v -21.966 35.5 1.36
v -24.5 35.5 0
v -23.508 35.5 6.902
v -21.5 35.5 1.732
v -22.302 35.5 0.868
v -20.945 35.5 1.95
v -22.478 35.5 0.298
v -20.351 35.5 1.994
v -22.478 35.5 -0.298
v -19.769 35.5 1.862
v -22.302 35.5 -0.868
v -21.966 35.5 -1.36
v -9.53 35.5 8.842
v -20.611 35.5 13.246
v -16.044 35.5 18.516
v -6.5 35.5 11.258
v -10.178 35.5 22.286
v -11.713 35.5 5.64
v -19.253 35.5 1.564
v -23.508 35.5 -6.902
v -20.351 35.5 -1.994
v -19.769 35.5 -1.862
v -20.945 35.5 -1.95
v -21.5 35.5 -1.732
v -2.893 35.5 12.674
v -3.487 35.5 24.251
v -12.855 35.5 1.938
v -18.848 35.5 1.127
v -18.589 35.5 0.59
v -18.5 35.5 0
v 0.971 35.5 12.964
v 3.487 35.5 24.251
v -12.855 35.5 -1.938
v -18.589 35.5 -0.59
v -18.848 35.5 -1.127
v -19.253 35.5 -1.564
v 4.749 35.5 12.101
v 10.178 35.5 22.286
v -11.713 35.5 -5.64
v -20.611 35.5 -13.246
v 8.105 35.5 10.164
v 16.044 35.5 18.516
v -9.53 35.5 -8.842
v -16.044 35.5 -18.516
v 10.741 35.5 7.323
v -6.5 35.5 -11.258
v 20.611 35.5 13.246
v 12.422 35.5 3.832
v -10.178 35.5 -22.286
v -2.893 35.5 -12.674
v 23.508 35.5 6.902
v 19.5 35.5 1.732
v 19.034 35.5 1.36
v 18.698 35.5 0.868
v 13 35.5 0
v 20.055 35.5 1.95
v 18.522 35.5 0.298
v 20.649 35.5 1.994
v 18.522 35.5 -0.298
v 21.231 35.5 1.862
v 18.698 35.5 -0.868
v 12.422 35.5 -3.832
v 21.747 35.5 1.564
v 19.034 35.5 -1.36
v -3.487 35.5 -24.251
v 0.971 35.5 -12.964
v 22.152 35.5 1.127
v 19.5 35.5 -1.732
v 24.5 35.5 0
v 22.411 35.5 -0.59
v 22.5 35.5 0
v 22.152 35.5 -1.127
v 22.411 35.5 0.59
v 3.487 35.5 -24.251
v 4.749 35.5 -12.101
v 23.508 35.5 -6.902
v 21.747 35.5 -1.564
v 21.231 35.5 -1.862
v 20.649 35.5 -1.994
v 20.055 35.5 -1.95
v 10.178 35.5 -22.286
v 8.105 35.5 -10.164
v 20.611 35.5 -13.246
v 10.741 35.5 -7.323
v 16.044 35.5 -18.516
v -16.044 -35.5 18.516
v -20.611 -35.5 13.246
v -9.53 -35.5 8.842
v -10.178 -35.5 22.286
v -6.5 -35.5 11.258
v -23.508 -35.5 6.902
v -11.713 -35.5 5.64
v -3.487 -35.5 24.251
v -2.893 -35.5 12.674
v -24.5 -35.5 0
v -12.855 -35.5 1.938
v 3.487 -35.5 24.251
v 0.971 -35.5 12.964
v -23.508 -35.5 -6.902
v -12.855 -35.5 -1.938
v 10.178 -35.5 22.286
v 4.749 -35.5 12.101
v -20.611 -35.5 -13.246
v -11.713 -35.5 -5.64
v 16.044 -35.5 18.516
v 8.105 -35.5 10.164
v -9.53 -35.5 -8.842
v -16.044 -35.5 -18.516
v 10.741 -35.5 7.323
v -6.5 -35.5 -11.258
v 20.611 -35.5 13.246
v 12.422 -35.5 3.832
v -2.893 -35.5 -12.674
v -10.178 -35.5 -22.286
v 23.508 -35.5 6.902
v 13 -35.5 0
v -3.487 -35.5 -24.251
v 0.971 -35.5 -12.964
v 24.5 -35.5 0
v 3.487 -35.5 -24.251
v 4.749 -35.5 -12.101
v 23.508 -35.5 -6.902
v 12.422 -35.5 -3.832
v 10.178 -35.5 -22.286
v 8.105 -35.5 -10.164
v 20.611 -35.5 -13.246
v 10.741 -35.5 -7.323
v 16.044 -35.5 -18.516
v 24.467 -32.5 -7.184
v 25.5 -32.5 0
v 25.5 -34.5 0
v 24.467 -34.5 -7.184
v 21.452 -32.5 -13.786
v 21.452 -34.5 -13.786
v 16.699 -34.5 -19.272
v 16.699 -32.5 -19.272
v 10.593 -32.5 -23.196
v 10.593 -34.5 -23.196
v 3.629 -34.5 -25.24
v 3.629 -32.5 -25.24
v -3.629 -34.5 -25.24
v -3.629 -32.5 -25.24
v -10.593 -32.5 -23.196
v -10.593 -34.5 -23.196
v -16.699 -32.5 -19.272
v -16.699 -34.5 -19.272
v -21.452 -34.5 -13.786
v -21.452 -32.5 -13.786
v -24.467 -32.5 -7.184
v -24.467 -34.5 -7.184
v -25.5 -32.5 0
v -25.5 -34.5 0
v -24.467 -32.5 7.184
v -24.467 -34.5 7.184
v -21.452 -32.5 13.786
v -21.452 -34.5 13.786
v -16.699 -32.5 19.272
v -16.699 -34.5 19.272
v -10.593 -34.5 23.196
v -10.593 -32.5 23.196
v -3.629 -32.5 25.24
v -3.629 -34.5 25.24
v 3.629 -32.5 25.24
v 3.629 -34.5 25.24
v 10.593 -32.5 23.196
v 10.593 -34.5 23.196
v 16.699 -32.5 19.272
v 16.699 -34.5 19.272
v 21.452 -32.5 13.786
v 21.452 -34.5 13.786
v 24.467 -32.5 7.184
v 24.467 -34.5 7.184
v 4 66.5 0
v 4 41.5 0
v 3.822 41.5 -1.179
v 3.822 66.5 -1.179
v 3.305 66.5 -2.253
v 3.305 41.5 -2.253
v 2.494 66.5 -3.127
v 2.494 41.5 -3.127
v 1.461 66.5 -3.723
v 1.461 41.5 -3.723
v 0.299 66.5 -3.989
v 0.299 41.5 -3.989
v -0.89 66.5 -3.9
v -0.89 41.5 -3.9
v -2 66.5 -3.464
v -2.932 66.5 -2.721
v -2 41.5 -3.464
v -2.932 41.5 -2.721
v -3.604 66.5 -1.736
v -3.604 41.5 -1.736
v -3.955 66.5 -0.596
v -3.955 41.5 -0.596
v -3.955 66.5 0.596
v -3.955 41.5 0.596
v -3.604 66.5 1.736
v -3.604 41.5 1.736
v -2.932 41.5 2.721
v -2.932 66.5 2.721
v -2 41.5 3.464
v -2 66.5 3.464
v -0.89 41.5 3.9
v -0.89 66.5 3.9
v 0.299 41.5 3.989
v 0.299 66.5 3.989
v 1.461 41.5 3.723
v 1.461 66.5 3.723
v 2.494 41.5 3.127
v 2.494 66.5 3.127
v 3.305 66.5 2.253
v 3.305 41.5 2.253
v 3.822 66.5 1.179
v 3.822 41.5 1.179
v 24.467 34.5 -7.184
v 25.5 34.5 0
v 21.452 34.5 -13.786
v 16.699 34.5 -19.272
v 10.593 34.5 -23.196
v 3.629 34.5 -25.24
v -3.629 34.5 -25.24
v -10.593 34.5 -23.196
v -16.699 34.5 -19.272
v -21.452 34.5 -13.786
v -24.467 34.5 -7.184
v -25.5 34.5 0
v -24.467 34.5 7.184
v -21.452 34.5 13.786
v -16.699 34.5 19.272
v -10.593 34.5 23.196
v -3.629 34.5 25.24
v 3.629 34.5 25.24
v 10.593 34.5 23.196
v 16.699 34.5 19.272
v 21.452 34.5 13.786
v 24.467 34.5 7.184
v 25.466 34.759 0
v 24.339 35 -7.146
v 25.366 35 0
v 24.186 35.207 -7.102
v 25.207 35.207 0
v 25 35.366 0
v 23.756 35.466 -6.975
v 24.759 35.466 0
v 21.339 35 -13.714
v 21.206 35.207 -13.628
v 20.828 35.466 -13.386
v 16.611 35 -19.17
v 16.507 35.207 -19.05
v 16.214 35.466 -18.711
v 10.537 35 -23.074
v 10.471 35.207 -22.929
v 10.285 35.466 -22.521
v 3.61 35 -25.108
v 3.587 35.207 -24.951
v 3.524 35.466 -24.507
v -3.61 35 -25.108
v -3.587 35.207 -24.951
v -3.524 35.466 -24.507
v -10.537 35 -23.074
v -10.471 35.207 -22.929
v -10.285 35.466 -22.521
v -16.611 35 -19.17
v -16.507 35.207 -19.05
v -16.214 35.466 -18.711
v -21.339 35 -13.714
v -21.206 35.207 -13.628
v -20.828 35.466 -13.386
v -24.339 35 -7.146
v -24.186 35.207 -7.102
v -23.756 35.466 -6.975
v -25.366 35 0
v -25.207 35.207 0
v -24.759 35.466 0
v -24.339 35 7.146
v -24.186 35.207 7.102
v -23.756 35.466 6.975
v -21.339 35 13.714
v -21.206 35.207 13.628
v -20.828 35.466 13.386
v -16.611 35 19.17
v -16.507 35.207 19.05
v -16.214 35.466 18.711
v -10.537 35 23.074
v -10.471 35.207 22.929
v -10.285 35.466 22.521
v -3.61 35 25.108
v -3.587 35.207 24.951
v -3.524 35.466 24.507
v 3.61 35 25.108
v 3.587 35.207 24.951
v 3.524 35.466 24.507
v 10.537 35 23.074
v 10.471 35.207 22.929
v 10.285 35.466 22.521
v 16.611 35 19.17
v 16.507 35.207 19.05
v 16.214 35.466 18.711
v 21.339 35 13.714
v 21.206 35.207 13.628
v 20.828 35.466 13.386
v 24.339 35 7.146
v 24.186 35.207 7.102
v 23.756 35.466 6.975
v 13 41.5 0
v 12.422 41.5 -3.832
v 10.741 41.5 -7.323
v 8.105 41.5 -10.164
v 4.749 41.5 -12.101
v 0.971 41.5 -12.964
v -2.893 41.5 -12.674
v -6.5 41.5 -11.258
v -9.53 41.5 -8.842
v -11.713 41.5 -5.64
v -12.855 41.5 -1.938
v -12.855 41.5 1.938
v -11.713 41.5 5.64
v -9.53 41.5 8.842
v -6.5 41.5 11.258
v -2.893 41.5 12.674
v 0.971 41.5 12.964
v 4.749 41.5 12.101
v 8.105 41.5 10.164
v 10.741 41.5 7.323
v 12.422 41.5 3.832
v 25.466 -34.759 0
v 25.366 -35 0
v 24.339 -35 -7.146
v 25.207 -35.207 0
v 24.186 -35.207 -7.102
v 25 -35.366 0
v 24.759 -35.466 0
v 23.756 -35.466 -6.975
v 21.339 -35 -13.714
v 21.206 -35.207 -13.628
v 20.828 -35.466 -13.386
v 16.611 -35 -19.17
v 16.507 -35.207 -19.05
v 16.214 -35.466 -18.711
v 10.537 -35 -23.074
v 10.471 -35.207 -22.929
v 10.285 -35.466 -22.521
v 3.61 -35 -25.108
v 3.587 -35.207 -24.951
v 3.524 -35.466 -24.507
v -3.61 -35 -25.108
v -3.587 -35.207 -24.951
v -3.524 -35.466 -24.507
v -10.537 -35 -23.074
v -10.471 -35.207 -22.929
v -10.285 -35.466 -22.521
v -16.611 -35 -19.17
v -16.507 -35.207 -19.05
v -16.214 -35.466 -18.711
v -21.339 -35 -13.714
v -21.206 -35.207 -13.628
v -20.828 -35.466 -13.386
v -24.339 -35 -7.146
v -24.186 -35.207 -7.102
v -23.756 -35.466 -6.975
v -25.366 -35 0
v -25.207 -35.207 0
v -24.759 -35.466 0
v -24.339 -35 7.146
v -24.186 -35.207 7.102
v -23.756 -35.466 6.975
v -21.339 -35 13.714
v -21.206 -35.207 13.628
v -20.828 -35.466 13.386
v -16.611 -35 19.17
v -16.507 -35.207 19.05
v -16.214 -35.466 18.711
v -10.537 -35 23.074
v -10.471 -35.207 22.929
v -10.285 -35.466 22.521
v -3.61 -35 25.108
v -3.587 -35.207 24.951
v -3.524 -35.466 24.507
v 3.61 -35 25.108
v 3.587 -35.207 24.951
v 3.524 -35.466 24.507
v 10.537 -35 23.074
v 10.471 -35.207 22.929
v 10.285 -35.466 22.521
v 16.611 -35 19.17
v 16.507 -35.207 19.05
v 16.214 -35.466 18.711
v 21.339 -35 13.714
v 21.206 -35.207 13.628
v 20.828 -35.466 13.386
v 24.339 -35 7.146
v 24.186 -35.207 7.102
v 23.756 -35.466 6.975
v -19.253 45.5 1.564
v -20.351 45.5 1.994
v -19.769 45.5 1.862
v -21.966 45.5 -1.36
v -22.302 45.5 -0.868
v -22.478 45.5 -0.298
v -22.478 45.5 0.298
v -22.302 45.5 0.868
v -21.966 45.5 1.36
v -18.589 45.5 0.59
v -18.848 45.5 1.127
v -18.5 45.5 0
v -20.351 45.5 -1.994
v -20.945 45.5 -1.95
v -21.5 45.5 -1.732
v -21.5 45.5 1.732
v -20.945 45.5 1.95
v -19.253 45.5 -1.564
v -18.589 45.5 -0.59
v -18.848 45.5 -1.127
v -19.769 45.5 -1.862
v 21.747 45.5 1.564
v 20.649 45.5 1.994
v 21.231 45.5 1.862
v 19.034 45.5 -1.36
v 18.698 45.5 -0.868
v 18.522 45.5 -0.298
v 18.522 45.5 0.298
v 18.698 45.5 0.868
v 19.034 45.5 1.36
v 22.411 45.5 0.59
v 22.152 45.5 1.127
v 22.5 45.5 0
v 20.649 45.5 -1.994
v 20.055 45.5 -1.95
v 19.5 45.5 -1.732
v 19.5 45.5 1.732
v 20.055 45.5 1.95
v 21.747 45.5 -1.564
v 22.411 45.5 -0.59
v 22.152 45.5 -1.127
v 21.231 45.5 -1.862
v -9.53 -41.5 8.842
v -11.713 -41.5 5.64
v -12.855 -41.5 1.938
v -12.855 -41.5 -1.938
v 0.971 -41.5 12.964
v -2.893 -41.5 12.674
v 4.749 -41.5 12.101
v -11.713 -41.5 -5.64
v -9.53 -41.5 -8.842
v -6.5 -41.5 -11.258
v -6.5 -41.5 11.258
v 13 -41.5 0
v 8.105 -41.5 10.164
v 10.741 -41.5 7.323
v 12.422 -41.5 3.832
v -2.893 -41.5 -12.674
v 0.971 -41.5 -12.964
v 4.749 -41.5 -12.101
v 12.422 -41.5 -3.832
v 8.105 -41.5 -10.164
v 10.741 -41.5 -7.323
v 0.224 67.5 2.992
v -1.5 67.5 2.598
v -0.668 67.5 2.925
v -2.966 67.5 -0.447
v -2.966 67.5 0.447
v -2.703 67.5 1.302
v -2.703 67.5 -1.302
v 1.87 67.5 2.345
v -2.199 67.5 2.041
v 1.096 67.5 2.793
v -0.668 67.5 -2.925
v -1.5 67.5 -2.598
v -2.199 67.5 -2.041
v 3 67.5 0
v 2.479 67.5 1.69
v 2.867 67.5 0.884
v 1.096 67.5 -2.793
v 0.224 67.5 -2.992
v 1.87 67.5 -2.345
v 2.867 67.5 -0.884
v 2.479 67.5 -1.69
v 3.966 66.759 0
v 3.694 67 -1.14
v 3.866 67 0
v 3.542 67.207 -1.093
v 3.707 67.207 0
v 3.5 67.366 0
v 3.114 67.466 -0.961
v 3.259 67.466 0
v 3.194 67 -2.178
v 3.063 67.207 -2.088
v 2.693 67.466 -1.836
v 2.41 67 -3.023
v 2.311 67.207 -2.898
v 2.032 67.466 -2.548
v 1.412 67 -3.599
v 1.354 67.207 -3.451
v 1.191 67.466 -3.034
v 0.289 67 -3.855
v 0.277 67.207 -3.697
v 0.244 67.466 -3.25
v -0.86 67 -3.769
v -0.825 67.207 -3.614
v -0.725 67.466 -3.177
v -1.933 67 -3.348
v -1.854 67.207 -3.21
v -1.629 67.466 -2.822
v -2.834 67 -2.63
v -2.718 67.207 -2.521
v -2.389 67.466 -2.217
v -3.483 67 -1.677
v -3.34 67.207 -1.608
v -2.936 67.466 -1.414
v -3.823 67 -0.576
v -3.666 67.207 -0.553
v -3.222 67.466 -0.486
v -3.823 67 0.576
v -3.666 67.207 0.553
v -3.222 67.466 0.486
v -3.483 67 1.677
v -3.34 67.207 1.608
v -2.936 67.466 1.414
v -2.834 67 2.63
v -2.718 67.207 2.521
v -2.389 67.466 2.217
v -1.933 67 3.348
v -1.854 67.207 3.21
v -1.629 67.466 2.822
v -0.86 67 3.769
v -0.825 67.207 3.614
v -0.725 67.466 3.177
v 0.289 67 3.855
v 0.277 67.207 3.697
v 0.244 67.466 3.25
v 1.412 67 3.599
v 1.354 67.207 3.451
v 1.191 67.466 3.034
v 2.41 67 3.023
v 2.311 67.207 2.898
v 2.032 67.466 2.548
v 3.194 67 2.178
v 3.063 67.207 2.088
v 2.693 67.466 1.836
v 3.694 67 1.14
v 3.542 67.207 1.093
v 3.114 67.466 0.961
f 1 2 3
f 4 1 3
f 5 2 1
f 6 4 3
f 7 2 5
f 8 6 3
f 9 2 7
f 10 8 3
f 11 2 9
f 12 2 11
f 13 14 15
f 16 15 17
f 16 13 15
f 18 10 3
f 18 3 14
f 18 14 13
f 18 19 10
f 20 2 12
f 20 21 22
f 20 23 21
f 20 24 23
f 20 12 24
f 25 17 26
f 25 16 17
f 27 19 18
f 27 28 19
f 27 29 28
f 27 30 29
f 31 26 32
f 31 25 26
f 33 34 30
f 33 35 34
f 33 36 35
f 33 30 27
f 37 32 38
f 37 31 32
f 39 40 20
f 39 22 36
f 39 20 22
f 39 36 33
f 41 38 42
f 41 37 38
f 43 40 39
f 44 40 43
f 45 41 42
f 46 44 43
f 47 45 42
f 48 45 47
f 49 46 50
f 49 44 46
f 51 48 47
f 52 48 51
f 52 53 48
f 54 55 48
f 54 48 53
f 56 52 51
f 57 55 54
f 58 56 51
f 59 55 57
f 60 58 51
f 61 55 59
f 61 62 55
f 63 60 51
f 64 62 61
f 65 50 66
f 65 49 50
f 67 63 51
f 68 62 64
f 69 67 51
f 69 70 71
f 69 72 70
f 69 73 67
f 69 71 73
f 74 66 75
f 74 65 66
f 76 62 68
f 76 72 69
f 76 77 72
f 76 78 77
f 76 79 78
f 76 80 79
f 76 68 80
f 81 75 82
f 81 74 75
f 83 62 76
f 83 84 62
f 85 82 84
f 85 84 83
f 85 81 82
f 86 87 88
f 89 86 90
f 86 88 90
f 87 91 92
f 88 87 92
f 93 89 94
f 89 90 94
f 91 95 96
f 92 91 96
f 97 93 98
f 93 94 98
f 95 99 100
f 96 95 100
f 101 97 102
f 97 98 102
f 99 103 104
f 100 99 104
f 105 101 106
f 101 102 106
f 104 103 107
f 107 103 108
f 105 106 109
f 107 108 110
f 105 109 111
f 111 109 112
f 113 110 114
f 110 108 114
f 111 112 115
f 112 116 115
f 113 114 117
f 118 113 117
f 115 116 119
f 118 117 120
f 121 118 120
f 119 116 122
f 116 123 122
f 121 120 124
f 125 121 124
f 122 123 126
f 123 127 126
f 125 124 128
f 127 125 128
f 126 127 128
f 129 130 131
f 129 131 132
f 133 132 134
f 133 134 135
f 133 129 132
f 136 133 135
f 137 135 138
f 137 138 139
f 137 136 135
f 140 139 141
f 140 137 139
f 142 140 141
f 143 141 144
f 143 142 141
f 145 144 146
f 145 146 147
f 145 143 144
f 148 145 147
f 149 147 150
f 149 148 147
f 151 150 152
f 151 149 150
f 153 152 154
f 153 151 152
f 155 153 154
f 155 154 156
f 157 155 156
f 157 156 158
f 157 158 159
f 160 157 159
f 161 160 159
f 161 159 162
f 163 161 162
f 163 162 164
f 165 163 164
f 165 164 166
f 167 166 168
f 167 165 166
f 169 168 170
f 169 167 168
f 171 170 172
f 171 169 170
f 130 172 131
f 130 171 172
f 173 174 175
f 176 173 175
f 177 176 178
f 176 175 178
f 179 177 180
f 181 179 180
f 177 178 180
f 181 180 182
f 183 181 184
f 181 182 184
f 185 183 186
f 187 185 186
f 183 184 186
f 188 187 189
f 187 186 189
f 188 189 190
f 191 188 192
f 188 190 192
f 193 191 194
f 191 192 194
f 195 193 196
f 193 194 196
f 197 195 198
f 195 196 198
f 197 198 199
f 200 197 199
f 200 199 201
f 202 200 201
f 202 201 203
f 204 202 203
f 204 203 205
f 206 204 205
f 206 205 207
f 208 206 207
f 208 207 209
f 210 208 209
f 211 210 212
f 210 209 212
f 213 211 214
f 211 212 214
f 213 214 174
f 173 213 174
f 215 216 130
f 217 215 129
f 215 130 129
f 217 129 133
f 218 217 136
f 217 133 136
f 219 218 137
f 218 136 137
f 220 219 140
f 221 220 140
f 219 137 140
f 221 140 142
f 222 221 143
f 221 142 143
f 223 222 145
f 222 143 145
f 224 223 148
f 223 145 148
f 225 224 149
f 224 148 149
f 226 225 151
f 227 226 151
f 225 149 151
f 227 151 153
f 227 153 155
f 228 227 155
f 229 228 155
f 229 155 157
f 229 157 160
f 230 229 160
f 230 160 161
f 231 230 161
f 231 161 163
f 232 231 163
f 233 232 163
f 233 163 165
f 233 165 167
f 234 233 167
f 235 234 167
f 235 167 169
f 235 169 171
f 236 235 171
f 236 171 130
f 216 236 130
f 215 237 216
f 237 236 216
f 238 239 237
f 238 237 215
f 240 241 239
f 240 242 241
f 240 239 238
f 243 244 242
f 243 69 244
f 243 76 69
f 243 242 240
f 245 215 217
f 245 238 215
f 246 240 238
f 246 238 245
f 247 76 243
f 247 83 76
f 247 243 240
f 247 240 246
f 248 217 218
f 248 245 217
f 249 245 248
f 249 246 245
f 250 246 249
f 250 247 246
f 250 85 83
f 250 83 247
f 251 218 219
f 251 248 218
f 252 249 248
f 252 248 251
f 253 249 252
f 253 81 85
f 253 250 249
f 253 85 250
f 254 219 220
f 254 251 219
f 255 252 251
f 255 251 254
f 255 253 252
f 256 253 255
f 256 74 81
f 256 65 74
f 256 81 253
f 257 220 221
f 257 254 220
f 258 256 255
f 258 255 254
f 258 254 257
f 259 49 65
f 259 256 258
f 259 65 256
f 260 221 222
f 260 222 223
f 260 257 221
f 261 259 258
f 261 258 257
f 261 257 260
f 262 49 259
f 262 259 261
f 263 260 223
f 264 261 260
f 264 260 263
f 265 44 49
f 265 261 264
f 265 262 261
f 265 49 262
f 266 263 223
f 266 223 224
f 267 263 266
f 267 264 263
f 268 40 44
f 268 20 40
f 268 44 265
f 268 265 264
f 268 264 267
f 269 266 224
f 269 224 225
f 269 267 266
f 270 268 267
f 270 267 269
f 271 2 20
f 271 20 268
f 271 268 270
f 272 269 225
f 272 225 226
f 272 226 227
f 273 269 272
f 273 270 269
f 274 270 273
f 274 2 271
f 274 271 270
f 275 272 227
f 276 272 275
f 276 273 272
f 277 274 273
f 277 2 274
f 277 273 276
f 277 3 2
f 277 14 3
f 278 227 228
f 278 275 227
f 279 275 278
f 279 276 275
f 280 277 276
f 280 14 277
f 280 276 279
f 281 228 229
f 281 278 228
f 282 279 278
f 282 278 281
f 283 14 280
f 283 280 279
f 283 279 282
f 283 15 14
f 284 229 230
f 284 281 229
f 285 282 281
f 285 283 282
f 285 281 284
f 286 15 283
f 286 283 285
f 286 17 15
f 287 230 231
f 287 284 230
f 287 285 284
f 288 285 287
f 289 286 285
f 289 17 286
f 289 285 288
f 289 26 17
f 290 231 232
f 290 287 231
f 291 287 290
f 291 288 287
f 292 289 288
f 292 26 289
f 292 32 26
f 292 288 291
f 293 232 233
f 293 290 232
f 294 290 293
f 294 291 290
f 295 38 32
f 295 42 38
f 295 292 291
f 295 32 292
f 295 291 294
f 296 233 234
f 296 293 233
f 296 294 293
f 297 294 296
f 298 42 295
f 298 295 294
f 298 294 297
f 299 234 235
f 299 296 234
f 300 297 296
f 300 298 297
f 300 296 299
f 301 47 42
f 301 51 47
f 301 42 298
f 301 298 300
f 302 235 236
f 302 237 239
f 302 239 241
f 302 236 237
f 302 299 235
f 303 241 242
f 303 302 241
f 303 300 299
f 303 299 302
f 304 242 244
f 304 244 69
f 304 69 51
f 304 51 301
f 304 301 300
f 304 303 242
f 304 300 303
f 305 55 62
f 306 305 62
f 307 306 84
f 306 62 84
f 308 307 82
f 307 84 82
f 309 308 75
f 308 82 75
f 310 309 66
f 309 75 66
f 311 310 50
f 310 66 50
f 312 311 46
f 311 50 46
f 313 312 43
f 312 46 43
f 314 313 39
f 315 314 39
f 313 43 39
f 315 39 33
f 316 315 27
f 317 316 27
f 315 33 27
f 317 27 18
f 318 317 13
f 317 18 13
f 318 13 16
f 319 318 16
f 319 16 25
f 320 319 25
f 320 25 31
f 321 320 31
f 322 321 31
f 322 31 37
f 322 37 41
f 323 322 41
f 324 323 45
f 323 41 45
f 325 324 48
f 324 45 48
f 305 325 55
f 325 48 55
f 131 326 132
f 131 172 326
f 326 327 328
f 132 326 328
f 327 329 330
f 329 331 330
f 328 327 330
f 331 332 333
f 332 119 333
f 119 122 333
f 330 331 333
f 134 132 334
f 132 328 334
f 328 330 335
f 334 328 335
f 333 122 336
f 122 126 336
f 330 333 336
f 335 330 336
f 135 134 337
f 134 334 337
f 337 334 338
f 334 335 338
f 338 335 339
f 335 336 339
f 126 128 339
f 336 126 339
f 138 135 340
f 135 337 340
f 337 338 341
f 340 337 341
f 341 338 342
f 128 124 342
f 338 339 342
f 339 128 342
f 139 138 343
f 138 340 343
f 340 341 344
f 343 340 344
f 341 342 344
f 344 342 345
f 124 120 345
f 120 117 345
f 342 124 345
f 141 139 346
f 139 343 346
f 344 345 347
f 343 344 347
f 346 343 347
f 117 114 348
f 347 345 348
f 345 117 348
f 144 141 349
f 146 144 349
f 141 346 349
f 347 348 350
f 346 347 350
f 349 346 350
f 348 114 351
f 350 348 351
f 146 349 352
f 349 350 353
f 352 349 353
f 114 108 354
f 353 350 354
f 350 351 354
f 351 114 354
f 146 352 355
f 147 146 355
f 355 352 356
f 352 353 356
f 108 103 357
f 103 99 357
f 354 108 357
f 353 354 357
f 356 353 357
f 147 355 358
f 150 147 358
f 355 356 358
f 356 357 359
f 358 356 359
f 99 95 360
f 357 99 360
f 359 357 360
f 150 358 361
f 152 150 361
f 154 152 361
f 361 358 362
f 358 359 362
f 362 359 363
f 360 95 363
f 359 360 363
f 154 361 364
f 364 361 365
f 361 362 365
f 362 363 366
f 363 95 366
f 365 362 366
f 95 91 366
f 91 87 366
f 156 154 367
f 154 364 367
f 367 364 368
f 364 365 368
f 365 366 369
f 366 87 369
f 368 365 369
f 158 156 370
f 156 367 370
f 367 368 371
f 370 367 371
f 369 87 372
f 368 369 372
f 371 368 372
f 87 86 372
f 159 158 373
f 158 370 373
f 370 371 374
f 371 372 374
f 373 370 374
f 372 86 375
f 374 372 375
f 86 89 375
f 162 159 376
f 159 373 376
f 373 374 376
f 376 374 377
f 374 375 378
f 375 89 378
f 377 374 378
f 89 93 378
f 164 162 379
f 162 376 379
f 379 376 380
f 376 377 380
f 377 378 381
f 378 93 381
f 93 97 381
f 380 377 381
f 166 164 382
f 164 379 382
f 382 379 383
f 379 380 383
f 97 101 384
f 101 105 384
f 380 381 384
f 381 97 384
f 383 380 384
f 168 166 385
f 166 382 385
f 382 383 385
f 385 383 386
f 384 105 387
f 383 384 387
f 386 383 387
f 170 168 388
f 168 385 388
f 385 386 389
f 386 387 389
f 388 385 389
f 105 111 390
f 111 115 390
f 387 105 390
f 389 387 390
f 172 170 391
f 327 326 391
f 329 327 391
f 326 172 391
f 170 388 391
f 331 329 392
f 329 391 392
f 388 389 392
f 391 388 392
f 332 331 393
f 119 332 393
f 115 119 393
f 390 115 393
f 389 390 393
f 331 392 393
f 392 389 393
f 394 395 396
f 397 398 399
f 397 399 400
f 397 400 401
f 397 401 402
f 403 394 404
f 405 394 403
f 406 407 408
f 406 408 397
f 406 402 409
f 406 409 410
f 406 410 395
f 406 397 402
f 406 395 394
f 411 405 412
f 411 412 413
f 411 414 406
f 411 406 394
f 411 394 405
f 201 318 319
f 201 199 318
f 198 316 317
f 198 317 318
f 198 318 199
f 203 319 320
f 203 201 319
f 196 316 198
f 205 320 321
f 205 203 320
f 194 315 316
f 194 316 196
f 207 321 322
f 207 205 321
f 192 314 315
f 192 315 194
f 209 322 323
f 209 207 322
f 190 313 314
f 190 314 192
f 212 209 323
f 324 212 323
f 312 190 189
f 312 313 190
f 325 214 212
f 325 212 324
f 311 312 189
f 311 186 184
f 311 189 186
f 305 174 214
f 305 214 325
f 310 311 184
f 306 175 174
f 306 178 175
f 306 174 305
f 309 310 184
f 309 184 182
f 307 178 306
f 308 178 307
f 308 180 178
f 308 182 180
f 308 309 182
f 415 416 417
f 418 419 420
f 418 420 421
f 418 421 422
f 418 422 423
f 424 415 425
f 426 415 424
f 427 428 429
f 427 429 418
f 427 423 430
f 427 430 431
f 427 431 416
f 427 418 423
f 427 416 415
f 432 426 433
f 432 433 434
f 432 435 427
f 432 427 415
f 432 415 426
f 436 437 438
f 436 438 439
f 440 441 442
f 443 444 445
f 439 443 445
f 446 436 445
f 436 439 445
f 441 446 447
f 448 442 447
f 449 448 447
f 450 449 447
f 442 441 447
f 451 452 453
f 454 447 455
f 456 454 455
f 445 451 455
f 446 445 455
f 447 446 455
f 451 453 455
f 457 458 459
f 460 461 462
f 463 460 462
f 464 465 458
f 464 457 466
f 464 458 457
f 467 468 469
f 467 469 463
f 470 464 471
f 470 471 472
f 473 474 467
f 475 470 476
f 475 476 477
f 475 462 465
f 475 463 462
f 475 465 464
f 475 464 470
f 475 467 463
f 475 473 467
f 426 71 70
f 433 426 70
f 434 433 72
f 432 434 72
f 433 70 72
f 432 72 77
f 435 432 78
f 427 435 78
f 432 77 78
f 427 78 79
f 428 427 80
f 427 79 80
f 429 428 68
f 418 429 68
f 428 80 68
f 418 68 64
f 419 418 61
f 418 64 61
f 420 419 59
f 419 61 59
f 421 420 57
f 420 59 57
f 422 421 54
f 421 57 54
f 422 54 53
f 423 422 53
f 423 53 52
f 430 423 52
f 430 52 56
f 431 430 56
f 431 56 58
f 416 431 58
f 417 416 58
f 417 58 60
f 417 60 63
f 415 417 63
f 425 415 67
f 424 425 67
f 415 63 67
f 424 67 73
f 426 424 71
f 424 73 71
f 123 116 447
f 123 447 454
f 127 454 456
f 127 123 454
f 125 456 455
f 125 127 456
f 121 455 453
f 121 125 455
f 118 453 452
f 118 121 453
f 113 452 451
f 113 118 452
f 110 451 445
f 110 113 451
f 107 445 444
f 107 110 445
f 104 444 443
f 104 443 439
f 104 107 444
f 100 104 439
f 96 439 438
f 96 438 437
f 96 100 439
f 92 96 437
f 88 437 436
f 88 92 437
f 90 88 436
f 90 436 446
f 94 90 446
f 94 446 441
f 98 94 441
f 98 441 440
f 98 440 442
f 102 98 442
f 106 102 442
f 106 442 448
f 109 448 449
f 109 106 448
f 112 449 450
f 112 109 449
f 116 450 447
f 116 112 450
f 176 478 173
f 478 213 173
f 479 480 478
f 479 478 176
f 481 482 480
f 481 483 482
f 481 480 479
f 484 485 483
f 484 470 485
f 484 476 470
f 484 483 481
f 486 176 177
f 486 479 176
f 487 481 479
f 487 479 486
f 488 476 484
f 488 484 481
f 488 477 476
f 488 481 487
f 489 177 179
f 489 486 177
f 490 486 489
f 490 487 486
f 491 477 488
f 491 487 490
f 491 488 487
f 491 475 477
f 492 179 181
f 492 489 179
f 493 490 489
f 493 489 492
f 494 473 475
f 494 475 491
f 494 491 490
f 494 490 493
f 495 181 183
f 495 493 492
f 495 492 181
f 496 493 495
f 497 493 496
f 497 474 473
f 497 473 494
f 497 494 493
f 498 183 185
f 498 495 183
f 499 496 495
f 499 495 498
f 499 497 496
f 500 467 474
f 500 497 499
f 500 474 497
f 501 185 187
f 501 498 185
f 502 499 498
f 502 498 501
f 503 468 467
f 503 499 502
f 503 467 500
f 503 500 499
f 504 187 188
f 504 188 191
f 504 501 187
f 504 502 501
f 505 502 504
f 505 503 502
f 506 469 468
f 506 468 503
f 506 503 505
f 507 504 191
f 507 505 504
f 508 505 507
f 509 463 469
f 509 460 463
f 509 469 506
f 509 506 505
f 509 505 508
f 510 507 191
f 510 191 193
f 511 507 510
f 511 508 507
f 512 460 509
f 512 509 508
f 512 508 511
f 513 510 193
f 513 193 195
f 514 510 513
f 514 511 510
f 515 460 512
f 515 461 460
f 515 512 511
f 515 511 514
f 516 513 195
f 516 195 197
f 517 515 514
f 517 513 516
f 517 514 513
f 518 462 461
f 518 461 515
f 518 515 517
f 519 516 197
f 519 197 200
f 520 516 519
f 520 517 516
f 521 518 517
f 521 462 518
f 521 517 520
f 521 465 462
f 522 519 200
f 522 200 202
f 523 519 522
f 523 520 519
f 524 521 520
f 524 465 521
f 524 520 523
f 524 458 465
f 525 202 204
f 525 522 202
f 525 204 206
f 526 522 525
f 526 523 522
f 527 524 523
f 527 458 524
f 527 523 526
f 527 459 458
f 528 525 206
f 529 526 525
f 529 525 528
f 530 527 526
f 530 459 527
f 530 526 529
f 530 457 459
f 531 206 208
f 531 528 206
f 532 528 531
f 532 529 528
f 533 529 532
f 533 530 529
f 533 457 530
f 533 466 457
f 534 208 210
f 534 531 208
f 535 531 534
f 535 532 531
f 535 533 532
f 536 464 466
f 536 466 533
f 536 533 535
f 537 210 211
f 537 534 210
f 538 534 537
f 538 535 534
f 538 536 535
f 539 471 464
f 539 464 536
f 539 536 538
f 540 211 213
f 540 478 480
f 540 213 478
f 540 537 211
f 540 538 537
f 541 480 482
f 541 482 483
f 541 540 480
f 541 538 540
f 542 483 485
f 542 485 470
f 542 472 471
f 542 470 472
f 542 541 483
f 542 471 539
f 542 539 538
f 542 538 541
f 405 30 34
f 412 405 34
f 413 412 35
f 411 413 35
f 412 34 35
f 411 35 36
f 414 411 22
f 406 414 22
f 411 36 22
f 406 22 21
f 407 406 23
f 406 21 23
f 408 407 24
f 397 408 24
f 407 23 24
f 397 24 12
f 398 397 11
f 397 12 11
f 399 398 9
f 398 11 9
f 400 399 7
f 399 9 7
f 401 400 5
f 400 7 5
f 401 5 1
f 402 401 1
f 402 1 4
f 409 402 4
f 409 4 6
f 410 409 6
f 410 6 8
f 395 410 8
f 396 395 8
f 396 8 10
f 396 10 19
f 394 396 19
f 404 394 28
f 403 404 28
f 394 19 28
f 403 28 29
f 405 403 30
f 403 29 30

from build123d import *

# Parameters (mm, degrees)
SKETCH2_R            = 25.5
BOSS_EXTRUDE1_DEPTH  = 32.5
SKETCH3_R            = 25.5
BOSS_EXTRUDE2_DEPTH  = 3
FILLET1_R            = 1
SKETCH4_R            = 13
BOSS_EXTRUDE3_DEPTH  = 6
FILLET1_OF_MIRROR1_R = 1
SKETCH5_R            = 4
BOSS_EXTRUDE4_DEPTH  = 26
SKETCH6_R            = 2
BOSS_EXTRUDE5_DEPTH  = 10
FILLET2_R            = 1


with BuildPart() as part:
    # Sketch2 → Boss-Extrude1 (new body, symmetric)
    with BuildSketch(Plane(origin=(0, 0, 0), x_dir=(1, 0, 0), z_dir=(0, 1, 0))):
        Circle(SKETCH2_R)
    extrude(amount=BOSS_EXTRUDE1_DEPTH, both=True)

    # Sketch3 → Boss-Extrude2 (add)
    with BuildSketch(Plane(origin=(0, 32.5, 0), x_dir=(1, 0, 0), z_dir=(0, 1, 0))):
        Circle(SKETCH3_R)
    boss_extrude2 = extrude(amount=BOSS_EXTRUDE2_DEPTH)

    # Fillet1
    fillet1_edges = [part.edges().sort_by_distance(p)[0] for p in [
        (-25.5, 35.5, 0),
    ]]
    fillet(fillet1_edges, radius=FILLET1_R)

    # Sketch4 → Boss-Extrude3 (add)
    with BuildSketch(Plane(origin=(0, 35.5, 0), x_dir=(1, 0, 0), z_dir=(0, 1, 0))):
        Circle(SKETCH4_R)
    boss_extrude3 = extrude(amount=BOSS_EXTRUDE3_DEPTH)

    # Mirror1: Boss-Extrude2, Boss-Extrude3 across plane
    add(boss_extrude2.mirror(Plane.ZX))
    add(boss_extrude3.mirror(Plane.ZX))

    # Fillet1 of Mirror1
    fillet1_of_mirror1_edges = [part.edges().sort_by_distance(p)[0] for p in [
        (-25.5, -35.5, 0),
    ]]
    fillet(fillet1_of_mirror1_edges, radius=FILLET1_OF_MIRROR1_R)

    # Sketch5 → Boss-Extrude4 (add)
    with BuildSketch(Plane(origin=(0, 41.5, 0), x_dir=(1, 0, 0), z_dir=(0, 1, 0))):
        Circle(SKETCH5_R)
    extrude(amount=BOSS_EXTRUDE4_DEPTH)

    # Sketch6 → Boss-Extrude5 (add)
    with BuildSketch(Plane(origin=(0, 35.5, 0), x_dir=(1, 0, 0), z_dir=(0, 1, 0))):
        with Locations((-20.5, 0)):
            Circle(SKETCH6_R)
        with Locations((20.5, 0)):
            Circle(SKETCH6_R)
    extrude(amount=BOSS_EXTRUDE5_DEPTH)

    # Fillet2
    fillet2_edges = [part.edges().sort_by_distance(p)[0] for p in [
        (-4, 67.5, 0),
    ]]
    fillet(fillet2_edges, radius=FILLET2_R)


solid = part.part
